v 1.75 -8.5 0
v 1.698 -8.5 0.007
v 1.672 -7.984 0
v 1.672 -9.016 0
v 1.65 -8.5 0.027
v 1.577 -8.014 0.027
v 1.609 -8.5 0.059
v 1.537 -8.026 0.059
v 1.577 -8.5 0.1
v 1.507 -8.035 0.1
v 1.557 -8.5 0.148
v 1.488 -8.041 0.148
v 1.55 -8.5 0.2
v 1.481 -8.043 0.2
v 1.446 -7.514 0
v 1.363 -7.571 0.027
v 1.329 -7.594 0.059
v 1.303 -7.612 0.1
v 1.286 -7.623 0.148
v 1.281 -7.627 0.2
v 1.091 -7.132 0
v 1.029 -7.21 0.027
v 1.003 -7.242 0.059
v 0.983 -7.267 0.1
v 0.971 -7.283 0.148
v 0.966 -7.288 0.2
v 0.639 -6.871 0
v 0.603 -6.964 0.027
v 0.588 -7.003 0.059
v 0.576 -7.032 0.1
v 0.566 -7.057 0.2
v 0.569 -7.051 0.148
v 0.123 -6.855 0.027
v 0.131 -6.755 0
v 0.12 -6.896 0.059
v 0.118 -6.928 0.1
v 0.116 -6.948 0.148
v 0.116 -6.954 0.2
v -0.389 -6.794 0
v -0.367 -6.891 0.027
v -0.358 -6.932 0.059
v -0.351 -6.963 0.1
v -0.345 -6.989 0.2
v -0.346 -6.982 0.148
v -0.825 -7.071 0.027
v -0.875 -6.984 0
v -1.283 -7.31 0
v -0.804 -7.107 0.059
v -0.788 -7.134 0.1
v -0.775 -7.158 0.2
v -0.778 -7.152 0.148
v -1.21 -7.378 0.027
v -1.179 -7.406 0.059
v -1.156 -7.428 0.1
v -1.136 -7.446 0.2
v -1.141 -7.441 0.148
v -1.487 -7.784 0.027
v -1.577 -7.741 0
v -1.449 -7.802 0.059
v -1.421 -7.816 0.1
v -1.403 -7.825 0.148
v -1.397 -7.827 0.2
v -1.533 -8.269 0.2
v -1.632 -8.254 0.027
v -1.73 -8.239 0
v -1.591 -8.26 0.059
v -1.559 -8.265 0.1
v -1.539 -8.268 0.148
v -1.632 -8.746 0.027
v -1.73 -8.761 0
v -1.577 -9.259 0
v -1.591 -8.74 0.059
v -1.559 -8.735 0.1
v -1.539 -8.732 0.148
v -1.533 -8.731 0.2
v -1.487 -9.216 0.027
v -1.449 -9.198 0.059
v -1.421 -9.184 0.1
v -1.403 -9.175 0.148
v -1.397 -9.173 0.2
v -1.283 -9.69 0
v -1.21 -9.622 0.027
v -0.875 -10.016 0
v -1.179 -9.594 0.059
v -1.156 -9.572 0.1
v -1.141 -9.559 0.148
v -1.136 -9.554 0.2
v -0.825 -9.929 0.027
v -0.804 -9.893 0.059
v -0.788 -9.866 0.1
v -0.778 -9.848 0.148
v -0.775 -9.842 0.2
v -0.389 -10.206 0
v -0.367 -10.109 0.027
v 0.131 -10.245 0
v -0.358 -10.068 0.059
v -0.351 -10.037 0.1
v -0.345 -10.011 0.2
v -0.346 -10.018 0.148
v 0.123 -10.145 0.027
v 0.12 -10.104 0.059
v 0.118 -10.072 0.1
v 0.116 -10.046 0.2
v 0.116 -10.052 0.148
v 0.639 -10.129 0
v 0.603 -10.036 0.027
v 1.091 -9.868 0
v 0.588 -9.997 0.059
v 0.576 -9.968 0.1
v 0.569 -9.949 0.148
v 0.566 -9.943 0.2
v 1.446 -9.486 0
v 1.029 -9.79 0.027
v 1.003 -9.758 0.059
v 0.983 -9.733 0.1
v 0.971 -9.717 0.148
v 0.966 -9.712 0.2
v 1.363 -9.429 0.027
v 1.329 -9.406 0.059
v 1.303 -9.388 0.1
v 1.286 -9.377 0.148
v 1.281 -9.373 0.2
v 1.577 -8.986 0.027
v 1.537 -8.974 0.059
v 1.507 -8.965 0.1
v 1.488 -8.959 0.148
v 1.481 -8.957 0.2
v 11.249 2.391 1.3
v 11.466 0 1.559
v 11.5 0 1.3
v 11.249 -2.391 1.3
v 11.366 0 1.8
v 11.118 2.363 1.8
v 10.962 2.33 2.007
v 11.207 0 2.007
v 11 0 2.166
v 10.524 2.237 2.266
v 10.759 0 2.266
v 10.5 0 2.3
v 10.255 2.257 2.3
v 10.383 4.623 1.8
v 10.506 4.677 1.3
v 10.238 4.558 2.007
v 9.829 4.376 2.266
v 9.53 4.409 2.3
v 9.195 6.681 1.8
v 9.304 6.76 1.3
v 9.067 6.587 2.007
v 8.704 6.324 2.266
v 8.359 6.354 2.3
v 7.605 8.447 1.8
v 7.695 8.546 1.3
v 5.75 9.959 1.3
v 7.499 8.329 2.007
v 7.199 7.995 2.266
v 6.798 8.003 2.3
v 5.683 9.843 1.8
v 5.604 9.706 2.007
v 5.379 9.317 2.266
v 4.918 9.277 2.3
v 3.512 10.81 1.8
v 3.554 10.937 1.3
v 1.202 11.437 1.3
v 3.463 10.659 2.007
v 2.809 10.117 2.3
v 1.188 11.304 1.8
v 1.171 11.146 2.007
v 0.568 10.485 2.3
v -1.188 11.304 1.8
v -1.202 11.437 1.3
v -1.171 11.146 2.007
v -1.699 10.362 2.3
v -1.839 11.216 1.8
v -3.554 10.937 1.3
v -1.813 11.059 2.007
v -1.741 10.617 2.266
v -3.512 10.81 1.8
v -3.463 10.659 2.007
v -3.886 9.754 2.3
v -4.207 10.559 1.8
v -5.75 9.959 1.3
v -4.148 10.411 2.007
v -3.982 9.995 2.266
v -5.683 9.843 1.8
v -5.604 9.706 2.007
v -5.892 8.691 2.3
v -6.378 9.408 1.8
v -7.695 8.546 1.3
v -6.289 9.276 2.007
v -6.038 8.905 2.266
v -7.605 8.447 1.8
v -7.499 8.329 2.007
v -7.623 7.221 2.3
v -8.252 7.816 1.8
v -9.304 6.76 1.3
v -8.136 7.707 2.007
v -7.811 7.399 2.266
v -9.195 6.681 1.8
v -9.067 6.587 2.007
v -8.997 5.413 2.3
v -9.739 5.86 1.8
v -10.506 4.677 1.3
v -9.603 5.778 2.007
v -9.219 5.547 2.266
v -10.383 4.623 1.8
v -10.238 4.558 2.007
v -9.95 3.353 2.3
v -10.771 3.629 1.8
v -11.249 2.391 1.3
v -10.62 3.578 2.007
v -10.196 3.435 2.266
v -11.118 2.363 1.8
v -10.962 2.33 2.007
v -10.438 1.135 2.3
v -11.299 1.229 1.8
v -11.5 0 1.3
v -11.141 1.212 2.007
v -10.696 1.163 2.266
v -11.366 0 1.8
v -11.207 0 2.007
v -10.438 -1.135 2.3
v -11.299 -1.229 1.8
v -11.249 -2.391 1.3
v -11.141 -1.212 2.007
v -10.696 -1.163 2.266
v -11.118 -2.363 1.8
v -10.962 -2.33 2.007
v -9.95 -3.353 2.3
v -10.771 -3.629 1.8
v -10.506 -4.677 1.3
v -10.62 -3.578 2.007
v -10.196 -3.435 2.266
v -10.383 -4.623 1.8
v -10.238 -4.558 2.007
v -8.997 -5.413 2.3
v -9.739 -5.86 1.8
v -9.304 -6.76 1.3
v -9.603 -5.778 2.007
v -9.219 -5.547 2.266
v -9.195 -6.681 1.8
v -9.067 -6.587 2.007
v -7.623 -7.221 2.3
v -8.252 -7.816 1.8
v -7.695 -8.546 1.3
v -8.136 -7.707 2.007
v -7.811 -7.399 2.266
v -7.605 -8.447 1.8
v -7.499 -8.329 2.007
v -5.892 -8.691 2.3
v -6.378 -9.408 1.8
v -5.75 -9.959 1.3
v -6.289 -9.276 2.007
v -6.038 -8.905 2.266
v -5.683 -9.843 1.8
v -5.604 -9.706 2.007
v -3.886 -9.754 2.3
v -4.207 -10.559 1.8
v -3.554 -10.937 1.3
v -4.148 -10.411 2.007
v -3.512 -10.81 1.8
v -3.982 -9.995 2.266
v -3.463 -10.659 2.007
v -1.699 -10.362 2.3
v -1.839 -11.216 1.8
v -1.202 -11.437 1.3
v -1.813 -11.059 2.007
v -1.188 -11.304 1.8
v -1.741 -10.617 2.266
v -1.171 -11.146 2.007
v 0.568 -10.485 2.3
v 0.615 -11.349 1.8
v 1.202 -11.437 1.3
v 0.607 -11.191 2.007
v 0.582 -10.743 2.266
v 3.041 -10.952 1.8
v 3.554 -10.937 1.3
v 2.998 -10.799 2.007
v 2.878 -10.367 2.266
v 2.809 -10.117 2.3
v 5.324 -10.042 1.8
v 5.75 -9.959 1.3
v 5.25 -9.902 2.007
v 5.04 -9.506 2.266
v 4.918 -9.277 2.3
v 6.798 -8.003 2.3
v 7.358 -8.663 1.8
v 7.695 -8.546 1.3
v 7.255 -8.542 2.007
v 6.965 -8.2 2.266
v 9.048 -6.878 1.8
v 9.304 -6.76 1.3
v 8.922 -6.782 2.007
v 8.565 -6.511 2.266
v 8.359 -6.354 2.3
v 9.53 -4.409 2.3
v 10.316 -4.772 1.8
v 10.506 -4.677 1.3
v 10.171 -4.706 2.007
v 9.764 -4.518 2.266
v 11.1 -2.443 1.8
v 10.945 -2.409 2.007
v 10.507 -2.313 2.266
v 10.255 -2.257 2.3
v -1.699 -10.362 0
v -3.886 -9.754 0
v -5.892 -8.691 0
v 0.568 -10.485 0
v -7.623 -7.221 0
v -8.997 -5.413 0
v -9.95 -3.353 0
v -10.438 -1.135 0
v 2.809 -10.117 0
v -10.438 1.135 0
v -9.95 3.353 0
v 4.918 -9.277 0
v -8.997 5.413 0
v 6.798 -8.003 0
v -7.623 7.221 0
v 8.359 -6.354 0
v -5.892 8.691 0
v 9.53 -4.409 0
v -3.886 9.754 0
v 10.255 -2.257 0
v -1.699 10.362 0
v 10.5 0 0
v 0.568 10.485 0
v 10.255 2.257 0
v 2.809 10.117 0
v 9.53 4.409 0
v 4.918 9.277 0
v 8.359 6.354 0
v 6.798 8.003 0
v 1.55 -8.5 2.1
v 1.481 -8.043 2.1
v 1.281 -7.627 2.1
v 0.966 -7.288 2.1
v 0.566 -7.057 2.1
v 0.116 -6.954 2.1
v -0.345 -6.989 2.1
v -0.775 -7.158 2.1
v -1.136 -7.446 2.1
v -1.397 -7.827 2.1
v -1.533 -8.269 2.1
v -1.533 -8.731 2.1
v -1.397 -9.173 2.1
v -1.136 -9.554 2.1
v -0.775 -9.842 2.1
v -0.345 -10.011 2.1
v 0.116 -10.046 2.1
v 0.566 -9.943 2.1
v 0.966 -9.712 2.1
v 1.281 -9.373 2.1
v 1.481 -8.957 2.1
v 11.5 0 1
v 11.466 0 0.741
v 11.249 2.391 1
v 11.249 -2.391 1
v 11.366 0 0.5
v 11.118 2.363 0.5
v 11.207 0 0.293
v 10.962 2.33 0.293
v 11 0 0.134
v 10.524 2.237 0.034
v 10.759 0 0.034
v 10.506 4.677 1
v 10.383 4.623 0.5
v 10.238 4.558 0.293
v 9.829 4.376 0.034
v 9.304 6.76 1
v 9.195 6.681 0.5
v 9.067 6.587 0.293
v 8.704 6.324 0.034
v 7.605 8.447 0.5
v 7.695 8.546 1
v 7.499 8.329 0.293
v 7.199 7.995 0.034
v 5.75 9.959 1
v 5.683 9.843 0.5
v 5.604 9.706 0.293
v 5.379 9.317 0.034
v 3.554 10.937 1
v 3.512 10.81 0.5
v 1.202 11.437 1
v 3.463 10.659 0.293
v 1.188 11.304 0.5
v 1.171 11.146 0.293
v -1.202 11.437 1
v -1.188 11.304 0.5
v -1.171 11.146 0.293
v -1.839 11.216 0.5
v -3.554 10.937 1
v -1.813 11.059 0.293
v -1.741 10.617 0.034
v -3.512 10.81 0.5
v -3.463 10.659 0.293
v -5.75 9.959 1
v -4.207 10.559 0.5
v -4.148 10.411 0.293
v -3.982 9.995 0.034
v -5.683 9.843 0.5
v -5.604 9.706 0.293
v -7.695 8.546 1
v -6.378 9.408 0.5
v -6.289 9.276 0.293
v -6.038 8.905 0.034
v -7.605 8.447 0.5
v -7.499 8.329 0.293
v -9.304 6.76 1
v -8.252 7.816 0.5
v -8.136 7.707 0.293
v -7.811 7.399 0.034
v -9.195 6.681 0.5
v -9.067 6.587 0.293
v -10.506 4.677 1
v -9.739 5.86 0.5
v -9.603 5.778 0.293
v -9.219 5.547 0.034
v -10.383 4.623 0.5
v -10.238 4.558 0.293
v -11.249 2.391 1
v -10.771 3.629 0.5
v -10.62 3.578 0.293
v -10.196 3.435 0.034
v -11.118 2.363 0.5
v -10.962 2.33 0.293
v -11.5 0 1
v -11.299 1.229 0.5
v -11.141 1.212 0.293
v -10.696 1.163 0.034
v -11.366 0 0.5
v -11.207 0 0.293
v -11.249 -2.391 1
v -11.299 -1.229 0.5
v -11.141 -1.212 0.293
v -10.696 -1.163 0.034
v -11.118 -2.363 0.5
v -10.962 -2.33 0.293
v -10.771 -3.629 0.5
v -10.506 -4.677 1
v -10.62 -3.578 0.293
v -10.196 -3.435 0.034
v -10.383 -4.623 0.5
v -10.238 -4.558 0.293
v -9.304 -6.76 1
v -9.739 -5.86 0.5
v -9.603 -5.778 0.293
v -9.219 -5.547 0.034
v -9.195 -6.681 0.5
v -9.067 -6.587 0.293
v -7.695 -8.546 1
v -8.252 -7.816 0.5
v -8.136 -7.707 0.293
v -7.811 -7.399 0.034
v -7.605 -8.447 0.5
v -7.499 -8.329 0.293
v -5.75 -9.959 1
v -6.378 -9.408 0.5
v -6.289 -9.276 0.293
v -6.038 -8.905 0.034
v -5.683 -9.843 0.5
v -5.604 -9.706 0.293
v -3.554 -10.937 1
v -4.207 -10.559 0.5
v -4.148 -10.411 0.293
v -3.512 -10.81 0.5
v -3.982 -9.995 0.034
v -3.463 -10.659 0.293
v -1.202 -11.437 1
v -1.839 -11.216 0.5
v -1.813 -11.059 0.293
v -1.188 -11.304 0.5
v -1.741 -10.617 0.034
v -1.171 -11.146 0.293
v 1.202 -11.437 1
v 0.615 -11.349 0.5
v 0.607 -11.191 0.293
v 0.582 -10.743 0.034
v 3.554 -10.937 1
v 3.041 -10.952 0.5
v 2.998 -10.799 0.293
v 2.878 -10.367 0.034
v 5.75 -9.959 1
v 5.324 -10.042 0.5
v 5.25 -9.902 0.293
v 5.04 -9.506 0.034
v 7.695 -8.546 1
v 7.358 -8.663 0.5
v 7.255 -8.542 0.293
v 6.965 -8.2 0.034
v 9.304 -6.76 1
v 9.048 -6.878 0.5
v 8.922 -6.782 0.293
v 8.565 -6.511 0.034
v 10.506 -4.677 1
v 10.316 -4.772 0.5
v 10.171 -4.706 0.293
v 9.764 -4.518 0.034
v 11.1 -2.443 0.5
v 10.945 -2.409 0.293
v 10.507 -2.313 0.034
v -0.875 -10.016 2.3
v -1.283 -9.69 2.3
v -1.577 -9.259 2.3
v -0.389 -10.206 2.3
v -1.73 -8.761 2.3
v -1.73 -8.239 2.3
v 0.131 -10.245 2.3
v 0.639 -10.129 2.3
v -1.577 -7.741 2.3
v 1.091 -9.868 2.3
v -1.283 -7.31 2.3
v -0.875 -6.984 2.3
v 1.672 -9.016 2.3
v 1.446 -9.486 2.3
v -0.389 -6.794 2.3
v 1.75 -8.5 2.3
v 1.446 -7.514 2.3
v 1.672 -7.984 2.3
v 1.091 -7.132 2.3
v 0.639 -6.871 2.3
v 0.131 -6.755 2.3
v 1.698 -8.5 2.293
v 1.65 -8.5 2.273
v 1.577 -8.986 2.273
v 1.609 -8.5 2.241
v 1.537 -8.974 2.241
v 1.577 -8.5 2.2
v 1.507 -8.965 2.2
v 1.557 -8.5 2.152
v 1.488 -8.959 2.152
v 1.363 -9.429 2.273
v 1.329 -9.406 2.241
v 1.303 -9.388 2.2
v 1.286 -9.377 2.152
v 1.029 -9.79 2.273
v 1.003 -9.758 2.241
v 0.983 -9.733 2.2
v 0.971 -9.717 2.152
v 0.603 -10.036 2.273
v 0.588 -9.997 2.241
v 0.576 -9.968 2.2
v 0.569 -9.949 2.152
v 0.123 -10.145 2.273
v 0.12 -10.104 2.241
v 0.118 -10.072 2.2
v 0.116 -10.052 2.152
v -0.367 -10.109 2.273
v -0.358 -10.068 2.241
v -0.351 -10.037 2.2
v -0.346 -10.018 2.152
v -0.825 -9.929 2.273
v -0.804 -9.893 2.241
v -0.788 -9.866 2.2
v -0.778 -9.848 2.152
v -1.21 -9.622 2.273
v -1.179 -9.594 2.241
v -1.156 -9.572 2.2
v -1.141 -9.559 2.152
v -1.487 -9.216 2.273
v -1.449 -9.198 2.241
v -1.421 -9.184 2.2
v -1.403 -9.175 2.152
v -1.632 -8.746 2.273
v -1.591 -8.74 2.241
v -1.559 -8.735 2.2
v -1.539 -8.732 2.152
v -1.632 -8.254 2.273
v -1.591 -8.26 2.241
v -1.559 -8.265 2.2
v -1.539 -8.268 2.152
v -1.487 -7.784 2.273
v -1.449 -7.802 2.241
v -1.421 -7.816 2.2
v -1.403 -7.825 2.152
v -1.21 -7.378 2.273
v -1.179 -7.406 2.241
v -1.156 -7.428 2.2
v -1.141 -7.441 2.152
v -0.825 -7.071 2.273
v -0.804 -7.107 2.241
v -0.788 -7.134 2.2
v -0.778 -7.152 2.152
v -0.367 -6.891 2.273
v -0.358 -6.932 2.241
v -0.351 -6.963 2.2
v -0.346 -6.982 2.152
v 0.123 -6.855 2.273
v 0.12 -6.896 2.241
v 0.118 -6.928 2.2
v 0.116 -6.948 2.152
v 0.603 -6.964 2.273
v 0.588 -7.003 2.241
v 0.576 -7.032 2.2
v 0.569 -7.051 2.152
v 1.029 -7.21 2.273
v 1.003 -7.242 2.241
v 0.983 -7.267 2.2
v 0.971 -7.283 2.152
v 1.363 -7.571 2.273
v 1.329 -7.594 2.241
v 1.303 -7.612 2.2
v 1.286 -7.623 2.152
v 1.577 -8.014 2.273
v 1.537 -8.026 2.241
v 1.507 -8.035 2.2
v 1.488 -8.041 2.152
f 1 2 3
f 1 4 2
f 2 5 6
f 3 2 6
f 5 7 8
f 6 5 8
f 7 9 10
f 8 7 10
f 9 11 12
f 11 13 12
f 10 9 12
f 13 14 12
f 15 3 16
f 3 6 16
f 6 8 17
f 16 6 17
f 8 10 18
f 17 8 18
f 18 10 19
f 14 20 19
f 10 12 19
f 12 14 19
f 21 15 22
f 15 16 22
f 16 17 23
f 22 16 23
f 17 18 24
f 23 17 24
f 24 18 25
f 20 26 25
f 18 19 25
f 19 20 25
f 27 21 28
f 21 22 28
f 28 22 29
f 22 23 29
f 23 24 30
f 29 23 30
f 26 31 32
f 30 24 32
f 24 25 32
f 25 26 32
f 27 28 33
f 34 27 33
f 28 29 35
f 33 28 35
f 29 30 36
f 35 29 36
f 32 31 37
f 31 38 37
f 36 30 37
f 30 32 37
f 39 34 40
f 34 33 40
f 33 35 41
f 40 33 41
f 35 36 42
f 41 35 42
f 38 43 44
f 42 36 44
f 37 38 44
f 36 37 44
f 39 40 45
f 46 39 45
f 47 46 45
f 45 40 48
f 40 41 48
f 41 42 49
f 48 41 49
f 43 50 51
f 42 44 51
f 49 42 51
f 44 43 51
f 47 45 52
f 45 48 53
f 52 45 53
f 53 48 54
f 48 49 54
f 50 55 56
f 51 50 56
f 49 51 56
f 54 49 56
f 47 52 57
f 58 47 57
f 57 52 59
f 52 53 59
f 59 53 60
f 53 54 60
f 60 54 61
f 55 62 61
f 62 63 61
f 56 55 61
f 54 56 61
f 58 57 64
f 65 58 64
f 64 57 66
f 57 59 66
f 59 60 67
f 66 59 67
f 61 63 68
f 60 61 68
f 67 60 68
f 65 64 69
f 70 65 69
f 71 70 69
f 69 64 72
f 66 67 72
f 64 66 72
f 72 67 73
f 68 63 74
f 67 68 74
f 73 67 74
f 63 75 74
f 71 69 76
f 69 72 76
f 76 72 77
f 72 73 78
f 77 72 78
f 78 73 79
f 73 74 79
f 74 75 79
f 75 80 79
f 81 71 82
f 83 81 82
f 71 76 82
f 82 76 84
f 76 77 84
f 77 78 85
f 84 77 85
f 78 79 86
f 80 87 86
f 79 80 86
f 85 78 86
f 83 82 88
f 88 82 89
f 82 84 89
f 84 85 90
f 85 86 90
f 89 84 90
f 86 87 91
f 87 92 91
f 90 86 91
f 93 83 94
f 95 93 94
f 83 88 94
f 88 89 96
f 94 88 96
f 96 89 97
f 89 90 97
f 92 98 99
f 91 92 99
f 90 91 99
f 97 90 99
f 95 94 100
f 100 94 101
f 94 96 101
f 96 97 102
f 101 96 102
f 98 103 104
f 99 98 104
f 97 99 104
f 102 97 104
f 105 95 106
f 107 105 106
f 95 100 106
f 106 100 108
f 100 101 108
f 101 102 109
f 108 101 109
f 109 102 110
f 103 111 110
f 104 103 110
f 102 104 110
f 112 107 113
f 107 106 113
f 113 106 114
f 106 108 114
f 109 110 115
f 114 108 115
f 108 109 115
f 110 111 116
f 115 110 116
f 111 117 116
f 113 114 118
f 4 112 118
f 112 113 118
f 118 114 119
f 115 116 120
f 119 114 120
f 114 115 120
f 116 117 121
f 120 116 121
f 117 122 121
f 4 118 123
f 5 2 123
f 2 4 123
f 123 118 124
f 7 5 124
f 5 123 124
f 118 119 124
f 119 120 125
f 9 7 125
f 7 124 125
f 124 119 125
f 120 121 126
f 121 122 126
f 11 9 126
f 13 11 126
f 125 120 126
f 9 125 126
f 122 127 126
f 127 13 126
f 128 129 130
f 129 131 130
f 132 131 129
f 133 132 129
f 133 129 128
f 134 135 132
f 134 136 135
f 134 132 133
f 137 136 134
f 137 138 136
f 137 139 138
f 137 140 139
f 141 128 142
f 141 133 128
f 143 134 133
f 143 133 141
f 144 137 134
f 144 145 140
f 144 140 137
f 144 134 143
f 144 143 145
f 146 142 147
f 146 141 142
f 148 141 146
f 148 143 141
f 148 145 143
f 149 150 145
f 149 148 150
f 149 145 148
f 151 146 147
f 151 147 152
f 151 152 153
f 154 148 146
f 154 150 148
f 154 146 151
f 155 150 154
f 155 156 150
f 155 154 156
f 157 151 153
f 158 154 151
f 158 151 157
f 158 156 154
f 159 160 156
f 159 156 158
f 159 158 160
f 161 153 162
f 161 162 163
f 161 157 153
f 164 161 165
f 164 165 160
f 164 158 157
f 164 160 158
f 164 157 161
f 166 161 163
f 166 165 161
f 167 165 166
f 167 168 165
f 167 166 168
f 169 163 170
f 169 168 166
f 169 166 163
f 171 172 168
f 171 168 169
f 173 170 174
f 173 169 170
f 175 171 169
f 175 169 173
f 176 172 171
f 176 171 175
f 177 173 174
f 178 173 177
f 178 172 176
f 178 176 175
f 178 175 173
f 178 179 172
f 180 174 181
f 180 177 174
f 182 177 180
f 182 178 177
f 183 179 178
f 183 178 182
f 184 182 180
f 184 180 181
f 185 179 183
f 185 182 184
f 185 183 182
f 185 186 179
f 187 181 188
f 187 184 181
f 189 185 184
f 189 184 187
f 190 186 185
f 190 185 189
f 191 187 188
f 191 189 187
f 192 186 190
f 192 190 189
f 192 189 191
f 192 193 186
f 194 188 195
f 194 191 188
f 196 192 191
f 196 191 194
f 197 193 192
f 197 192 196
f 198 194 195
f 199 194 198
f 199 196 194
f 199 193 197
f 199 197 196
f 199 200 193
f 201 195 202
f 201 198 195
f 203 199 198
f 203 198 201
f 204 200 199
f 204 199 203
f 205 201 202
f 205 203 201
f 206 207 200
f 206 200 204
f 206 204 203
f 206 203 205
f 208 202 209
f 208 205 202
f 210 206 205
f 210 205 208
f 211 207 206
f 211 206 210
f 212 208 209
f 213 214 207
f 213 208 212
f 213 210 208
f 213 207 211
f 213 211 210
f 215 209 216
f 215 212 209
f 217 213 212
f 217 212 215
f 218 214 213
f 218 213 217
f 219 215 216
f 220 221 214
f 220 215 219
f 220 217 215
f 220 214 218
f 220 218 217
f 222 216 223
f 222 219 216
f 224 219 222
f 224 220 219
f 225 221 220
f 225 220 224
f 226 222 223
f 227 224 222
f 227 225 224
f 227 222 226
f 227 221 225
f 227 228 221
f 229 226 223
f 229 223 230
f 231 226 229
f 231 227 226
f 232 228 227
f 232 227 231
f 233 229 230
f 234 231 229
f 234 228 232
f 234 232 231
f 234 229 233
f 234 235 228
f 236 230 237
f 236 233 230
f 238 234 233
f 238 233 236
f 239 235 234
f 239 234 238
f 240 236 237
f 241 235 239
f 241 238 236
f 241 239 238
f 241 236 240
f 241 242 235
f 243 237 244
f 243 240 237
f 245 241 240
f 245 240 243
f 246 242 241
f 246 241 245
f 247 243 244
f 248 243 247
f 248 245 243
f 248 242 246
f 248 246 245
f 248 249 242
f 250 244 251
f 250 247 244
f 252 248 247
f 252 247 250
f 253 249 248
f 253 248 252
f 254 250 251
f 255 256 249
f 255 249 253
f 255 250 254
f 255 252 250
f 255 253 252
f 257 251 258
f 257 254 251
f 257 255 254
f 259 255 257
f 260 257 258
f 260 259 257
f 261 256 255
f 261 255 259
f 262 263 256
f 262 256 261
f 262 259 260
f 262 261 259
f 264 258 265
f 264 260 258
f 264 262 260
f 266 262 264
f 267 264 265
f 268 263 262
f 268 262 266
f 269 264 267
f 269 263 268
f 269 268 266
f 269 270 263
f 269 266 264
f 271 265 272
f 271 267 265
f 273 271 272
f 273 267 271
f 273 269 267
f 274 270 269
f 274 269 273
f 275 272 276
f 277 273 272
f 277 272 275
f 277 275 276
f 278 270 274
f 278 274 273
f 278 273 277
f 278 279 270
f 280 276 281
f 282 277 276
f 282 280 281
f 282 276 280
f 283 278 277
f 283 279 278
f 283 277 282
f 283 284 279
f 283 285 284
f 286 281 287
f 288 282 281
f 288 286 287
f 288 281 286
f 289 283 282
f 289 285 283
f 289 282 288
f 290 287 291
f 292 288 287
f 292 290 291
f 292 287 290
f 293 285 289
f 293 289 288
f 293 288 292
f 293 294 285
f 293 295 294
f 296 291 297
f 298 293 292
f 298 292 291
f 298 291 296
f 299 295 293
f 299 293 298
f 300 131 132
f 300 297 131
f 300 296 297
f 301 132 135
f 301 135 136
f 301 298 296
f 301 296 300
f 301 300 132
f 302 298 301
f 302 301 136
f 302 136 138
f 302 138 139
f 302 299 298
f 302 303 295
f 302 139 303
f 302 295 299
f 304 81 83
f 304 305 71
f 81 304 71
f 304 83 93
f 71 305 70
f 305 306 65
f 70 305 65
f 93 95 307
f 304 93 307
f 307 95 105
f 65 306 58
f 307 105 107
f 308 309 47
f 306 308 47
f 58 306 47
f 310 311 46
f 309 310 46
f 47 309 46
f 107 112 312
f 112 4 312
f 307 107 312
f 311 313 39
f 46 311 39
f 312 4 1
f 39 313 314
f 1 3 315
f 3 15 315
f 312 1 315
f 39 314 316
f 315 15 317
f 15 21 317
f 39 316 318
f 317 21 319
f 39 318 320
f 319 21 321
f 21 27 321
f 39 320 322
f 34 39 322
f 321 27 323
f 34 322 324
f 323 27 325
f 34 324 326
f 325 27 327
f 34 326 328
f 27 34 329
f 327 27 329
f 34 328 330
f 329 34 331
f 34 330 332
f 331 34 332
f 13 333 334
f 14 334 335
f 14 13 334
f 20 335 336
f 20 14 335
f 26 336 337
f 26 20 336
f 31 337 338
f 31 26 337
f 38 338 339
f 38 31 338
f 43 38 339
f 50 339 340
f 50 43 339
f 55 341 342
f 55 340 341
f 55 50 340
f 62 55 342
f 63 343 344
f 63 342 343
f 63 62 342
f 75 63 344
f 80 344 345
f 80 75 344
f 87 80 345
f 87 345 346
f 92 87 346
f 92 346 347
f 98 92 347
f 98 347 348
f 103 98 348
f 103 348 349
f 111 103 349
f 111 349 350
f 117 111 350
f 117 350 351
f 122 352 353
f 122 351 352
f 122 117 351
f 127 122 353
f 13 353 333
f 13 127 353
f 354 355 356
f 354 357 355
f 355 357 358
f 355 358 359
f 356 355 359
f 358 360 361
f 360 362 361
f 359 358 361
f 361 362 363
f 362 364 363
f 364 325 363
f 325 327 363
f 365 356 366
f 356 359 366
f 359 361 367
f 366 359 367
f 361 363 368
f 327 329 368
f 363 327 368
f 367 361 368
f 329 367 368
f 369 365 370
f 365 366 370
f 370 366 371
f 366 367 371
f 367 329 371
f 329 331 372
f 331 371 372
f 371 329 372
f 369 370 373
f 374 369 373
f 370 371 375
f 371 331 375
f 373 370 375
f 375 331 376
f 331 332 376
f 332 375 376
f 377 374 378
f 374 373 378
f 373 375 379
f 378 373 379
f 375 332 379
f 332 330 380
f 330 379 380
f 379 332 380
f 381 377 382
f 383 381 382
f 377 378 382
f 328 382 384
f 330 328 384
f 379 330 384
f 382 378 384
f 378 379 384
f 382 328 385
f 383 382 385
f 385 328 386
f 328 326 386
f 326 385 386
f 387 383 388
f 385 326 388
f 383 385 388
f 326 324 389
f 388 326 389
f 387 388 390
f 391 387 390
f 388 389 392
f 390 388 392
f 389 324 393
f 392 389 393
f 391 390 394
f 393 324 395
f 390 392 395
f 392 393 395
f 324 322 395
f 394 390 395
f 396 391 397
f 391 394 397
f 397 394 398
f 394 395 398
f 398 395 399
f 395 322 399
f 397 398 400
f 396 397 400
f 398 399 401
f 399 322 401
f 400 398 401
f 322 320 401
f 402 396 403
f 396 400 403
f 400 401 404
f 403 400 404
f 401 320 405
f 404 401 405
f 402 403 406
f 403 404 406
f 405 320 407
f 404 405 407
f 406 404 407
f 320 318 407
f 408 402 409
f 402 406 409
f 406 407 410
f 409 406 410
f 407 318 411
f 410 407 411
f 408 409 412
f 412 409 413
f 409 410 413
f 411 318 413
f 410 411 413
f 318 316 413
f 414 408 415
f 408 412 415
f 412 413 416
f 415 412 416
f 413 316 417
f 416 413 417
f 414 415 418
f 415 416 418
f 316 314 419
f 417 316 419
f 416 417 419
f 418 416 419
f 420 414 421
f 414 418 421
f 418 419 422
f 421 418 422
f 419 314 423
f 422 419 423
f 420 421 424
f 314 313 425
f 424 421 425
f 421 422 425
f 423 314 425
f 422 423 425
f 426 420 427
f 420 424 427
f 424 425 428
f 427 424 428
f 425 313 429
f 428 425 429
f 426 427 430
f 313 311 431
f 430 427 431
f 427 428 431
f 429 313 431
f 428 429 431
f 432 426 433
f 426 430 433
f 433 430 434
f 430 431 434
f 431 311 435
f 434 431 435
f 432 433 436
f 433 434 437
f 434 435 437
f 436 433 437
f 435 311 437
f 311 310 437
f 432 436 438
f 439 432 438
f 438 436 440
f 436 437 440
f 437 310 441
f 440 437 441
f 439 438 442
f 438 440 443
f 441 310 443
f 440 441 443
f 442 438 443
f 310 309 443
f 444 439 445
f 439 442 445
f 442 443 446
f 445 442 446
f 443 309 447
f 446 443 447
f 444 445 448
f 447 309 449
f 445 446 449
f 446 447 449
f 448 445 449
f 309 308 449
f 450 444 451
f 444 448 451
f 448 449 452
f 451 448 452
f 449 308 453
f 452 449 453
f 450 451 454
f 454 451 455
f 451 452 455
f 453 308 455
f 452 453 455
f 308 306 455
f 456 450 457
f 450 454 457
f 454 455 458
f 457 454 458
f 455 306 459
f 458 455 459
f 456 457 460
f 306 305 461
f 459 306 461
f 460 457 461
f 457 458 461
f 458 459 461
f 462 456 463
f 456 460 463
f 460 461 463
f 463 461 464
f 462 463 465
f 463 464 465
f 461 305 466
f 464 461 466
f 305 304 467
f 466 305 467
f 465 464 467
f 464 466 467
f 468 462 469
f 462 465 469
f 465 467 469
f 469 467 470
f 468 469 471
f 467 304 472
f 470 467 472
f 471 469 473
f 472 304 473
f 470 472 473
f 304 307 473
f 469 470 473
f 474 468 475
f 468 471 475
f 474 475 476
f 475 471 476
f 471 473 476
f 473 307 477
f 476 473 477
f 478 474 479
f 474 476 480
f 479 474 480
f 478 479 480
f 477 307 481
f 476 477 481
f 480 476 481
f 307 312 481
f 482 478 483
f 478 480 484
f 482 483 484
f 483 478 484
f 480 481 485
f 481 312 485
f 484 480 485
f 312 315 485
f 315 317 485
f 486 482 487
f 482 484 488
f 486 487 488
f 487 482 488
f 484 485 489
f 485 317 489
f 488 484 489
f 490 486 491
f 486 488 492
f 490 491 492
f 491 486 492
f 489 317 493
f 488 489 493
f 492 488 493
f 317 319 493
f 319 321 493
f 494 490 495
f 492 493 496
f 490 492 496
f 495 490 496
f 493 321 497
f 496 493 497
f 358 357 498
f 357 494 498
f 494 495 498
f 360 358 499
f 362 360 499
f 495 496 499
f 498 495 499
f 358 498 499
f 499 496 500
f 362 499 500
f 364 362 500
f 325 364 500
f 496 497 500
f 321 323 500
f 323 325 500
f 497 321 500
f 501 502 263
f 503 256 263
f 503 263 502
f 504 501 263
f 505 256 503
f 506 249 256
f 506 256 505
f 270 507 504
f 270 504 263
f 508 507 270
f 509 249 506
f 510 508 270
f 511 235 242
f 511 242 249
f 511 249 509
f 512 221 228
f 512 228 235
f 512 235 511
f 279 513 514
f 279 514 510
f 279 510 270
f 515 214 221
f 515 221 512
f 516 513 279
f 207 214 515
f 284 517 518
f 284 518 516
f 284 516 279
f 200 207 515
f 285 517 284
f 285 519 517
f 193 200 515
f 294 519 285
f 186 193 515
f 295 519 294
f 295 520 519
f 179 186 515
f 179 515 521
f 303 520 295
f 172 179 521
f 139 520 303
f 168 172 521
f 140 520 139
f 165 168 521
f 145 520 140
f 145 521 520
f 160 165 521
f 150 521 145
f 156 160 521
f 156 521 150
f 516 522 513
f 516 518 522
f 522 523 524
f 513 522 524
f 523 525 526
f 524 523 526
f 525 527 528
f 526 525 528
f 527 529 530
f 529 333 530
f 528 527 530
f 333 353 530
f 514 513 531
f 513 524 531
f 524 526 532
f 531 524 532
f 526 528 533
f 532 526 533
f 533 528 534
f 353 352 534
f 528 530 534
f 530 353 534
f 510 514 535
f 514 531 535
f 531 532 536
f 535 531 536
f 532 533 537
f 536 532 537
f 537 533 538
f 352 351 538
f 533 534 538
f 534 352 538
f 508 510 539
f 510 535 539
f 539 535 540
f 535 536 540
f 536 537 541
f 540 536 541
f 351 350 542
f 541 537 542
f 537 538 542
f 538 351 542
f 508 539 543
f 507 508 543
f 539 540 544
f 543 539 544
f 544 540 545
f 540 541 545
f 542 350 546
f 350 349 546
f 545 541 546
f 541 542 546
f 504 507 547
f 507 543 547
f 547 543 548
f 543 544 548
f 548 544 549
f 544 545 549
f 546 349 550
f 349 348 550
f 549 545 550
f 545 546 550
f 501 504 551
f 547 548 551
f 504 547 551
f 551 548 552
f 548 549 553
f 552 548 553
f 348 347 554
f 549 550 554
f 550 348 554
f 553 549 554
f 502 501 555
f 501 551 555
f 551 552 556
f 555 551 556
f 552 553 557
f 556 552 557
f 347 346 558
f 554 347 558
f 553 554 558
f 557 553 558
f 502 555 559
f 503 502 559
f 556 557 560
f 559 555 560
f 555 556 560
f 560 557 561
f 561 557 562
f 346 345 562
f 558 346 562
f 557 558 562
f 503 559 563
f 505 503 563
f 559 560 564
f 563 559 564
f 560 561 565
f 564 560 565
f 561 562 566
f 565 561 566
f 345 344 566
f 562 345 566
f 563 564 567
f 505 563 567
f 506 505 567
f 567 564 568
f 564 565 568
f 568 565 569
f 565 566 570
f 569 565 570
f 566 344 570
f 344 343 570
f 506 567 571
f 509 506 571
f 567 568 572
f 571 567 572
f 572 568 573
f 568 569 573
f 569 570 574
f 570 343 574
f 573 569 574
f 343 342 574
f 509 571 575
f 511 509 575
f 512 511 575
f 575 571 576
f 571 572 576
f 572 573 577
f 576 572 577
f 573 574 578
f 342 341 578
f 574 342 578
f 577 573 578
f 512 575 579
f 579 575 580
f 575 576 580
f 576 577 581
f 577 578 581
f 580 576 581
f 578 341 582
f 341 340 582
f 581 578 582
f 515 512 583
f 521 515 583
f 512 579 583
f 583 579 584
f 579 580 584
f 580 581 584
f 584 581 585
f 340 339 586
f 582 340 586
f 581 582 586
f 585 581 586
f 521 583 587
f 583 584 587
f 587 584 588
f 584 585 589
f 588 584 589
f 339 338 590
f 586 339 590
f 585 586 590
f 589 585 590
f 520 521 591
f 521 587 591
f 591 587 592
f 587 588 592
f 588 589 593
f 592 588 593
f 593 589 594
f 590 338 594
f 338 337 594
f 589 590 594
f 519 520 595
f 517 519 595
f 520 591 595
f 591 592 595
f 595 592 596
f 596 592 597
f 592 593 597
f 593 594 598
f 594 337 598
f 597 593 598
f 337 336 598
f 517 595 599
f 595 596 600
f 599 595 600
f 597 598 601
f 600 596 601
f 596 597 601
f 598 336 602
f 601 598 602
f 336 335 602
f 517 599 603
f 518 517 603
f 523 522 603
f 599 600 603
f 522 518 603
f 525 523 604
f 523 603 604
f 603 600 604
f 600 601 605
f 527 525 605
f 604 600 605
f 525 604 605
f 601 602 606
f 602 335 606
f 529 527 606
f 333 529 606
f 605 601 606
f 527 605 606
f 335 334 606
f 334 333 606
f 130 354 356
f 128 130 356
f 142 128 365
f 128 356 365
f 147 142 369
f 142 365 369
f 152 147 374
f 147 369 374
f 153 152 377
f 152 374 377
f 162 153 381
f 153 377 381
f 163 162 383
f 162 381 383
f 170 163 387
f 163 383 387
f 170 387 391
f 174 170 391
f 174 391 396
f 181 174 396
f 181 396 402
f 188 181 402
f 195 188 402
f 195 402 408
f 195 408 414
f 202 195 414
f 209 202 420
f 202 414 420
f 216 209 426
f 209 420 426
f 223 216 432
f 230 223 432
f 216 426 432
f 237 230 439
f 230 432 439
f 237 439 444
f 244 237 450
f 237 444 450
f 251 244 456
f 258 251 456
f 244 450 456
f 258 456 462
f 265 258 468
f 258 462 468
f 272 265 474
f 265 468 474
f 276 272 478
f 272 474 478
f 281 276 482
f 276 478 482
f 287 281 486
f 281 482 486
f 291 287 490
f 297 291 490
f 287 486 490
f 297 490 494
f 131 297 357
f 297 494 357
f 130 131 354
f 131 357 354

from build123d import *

# Parameters (mm, degrees)
F0_R     = 11.5
F2_DEPTH = 2.3
F1_R     = 1.55
F3_DEPTH = 25
F4_R     = 1
F5_R     = 0.2


with BuildPart() as f2:
    # F0 (on Top) → F2 (new body)
    with BuildSketch(Plane.XY):
        Circle(F0_R)
    extrude(amount=F2_DEPTH)

    # F1 (on Top) → F3 (cut)
    with BuildSketch(Plane.XY):
        with Locations((0, -8.5)):
            Circle(F1_R)
    extrude(amount=F3_DEPTH, mode=Mode.SUBTRACT)

    # F4
    f4_edges = [f2.edges().sort_by_distance(p)[0] for p in [
        (-11.5, 0, 2.3),
        (-11.5, 0, 0),
    ]]
    fillet(f4_edges, radius=F4_R)

    # F5
    f5_edges = [f2.edges().sort_by_distance(p)[0] for p in [
        (-10.5, 0, 2.3),
        (-1.55, -8.5, 2.3),
        (-1.55, -8.5, 0),
    ]]
    fillet(f5_edges, radius=F5_R)


solid = f2.part
